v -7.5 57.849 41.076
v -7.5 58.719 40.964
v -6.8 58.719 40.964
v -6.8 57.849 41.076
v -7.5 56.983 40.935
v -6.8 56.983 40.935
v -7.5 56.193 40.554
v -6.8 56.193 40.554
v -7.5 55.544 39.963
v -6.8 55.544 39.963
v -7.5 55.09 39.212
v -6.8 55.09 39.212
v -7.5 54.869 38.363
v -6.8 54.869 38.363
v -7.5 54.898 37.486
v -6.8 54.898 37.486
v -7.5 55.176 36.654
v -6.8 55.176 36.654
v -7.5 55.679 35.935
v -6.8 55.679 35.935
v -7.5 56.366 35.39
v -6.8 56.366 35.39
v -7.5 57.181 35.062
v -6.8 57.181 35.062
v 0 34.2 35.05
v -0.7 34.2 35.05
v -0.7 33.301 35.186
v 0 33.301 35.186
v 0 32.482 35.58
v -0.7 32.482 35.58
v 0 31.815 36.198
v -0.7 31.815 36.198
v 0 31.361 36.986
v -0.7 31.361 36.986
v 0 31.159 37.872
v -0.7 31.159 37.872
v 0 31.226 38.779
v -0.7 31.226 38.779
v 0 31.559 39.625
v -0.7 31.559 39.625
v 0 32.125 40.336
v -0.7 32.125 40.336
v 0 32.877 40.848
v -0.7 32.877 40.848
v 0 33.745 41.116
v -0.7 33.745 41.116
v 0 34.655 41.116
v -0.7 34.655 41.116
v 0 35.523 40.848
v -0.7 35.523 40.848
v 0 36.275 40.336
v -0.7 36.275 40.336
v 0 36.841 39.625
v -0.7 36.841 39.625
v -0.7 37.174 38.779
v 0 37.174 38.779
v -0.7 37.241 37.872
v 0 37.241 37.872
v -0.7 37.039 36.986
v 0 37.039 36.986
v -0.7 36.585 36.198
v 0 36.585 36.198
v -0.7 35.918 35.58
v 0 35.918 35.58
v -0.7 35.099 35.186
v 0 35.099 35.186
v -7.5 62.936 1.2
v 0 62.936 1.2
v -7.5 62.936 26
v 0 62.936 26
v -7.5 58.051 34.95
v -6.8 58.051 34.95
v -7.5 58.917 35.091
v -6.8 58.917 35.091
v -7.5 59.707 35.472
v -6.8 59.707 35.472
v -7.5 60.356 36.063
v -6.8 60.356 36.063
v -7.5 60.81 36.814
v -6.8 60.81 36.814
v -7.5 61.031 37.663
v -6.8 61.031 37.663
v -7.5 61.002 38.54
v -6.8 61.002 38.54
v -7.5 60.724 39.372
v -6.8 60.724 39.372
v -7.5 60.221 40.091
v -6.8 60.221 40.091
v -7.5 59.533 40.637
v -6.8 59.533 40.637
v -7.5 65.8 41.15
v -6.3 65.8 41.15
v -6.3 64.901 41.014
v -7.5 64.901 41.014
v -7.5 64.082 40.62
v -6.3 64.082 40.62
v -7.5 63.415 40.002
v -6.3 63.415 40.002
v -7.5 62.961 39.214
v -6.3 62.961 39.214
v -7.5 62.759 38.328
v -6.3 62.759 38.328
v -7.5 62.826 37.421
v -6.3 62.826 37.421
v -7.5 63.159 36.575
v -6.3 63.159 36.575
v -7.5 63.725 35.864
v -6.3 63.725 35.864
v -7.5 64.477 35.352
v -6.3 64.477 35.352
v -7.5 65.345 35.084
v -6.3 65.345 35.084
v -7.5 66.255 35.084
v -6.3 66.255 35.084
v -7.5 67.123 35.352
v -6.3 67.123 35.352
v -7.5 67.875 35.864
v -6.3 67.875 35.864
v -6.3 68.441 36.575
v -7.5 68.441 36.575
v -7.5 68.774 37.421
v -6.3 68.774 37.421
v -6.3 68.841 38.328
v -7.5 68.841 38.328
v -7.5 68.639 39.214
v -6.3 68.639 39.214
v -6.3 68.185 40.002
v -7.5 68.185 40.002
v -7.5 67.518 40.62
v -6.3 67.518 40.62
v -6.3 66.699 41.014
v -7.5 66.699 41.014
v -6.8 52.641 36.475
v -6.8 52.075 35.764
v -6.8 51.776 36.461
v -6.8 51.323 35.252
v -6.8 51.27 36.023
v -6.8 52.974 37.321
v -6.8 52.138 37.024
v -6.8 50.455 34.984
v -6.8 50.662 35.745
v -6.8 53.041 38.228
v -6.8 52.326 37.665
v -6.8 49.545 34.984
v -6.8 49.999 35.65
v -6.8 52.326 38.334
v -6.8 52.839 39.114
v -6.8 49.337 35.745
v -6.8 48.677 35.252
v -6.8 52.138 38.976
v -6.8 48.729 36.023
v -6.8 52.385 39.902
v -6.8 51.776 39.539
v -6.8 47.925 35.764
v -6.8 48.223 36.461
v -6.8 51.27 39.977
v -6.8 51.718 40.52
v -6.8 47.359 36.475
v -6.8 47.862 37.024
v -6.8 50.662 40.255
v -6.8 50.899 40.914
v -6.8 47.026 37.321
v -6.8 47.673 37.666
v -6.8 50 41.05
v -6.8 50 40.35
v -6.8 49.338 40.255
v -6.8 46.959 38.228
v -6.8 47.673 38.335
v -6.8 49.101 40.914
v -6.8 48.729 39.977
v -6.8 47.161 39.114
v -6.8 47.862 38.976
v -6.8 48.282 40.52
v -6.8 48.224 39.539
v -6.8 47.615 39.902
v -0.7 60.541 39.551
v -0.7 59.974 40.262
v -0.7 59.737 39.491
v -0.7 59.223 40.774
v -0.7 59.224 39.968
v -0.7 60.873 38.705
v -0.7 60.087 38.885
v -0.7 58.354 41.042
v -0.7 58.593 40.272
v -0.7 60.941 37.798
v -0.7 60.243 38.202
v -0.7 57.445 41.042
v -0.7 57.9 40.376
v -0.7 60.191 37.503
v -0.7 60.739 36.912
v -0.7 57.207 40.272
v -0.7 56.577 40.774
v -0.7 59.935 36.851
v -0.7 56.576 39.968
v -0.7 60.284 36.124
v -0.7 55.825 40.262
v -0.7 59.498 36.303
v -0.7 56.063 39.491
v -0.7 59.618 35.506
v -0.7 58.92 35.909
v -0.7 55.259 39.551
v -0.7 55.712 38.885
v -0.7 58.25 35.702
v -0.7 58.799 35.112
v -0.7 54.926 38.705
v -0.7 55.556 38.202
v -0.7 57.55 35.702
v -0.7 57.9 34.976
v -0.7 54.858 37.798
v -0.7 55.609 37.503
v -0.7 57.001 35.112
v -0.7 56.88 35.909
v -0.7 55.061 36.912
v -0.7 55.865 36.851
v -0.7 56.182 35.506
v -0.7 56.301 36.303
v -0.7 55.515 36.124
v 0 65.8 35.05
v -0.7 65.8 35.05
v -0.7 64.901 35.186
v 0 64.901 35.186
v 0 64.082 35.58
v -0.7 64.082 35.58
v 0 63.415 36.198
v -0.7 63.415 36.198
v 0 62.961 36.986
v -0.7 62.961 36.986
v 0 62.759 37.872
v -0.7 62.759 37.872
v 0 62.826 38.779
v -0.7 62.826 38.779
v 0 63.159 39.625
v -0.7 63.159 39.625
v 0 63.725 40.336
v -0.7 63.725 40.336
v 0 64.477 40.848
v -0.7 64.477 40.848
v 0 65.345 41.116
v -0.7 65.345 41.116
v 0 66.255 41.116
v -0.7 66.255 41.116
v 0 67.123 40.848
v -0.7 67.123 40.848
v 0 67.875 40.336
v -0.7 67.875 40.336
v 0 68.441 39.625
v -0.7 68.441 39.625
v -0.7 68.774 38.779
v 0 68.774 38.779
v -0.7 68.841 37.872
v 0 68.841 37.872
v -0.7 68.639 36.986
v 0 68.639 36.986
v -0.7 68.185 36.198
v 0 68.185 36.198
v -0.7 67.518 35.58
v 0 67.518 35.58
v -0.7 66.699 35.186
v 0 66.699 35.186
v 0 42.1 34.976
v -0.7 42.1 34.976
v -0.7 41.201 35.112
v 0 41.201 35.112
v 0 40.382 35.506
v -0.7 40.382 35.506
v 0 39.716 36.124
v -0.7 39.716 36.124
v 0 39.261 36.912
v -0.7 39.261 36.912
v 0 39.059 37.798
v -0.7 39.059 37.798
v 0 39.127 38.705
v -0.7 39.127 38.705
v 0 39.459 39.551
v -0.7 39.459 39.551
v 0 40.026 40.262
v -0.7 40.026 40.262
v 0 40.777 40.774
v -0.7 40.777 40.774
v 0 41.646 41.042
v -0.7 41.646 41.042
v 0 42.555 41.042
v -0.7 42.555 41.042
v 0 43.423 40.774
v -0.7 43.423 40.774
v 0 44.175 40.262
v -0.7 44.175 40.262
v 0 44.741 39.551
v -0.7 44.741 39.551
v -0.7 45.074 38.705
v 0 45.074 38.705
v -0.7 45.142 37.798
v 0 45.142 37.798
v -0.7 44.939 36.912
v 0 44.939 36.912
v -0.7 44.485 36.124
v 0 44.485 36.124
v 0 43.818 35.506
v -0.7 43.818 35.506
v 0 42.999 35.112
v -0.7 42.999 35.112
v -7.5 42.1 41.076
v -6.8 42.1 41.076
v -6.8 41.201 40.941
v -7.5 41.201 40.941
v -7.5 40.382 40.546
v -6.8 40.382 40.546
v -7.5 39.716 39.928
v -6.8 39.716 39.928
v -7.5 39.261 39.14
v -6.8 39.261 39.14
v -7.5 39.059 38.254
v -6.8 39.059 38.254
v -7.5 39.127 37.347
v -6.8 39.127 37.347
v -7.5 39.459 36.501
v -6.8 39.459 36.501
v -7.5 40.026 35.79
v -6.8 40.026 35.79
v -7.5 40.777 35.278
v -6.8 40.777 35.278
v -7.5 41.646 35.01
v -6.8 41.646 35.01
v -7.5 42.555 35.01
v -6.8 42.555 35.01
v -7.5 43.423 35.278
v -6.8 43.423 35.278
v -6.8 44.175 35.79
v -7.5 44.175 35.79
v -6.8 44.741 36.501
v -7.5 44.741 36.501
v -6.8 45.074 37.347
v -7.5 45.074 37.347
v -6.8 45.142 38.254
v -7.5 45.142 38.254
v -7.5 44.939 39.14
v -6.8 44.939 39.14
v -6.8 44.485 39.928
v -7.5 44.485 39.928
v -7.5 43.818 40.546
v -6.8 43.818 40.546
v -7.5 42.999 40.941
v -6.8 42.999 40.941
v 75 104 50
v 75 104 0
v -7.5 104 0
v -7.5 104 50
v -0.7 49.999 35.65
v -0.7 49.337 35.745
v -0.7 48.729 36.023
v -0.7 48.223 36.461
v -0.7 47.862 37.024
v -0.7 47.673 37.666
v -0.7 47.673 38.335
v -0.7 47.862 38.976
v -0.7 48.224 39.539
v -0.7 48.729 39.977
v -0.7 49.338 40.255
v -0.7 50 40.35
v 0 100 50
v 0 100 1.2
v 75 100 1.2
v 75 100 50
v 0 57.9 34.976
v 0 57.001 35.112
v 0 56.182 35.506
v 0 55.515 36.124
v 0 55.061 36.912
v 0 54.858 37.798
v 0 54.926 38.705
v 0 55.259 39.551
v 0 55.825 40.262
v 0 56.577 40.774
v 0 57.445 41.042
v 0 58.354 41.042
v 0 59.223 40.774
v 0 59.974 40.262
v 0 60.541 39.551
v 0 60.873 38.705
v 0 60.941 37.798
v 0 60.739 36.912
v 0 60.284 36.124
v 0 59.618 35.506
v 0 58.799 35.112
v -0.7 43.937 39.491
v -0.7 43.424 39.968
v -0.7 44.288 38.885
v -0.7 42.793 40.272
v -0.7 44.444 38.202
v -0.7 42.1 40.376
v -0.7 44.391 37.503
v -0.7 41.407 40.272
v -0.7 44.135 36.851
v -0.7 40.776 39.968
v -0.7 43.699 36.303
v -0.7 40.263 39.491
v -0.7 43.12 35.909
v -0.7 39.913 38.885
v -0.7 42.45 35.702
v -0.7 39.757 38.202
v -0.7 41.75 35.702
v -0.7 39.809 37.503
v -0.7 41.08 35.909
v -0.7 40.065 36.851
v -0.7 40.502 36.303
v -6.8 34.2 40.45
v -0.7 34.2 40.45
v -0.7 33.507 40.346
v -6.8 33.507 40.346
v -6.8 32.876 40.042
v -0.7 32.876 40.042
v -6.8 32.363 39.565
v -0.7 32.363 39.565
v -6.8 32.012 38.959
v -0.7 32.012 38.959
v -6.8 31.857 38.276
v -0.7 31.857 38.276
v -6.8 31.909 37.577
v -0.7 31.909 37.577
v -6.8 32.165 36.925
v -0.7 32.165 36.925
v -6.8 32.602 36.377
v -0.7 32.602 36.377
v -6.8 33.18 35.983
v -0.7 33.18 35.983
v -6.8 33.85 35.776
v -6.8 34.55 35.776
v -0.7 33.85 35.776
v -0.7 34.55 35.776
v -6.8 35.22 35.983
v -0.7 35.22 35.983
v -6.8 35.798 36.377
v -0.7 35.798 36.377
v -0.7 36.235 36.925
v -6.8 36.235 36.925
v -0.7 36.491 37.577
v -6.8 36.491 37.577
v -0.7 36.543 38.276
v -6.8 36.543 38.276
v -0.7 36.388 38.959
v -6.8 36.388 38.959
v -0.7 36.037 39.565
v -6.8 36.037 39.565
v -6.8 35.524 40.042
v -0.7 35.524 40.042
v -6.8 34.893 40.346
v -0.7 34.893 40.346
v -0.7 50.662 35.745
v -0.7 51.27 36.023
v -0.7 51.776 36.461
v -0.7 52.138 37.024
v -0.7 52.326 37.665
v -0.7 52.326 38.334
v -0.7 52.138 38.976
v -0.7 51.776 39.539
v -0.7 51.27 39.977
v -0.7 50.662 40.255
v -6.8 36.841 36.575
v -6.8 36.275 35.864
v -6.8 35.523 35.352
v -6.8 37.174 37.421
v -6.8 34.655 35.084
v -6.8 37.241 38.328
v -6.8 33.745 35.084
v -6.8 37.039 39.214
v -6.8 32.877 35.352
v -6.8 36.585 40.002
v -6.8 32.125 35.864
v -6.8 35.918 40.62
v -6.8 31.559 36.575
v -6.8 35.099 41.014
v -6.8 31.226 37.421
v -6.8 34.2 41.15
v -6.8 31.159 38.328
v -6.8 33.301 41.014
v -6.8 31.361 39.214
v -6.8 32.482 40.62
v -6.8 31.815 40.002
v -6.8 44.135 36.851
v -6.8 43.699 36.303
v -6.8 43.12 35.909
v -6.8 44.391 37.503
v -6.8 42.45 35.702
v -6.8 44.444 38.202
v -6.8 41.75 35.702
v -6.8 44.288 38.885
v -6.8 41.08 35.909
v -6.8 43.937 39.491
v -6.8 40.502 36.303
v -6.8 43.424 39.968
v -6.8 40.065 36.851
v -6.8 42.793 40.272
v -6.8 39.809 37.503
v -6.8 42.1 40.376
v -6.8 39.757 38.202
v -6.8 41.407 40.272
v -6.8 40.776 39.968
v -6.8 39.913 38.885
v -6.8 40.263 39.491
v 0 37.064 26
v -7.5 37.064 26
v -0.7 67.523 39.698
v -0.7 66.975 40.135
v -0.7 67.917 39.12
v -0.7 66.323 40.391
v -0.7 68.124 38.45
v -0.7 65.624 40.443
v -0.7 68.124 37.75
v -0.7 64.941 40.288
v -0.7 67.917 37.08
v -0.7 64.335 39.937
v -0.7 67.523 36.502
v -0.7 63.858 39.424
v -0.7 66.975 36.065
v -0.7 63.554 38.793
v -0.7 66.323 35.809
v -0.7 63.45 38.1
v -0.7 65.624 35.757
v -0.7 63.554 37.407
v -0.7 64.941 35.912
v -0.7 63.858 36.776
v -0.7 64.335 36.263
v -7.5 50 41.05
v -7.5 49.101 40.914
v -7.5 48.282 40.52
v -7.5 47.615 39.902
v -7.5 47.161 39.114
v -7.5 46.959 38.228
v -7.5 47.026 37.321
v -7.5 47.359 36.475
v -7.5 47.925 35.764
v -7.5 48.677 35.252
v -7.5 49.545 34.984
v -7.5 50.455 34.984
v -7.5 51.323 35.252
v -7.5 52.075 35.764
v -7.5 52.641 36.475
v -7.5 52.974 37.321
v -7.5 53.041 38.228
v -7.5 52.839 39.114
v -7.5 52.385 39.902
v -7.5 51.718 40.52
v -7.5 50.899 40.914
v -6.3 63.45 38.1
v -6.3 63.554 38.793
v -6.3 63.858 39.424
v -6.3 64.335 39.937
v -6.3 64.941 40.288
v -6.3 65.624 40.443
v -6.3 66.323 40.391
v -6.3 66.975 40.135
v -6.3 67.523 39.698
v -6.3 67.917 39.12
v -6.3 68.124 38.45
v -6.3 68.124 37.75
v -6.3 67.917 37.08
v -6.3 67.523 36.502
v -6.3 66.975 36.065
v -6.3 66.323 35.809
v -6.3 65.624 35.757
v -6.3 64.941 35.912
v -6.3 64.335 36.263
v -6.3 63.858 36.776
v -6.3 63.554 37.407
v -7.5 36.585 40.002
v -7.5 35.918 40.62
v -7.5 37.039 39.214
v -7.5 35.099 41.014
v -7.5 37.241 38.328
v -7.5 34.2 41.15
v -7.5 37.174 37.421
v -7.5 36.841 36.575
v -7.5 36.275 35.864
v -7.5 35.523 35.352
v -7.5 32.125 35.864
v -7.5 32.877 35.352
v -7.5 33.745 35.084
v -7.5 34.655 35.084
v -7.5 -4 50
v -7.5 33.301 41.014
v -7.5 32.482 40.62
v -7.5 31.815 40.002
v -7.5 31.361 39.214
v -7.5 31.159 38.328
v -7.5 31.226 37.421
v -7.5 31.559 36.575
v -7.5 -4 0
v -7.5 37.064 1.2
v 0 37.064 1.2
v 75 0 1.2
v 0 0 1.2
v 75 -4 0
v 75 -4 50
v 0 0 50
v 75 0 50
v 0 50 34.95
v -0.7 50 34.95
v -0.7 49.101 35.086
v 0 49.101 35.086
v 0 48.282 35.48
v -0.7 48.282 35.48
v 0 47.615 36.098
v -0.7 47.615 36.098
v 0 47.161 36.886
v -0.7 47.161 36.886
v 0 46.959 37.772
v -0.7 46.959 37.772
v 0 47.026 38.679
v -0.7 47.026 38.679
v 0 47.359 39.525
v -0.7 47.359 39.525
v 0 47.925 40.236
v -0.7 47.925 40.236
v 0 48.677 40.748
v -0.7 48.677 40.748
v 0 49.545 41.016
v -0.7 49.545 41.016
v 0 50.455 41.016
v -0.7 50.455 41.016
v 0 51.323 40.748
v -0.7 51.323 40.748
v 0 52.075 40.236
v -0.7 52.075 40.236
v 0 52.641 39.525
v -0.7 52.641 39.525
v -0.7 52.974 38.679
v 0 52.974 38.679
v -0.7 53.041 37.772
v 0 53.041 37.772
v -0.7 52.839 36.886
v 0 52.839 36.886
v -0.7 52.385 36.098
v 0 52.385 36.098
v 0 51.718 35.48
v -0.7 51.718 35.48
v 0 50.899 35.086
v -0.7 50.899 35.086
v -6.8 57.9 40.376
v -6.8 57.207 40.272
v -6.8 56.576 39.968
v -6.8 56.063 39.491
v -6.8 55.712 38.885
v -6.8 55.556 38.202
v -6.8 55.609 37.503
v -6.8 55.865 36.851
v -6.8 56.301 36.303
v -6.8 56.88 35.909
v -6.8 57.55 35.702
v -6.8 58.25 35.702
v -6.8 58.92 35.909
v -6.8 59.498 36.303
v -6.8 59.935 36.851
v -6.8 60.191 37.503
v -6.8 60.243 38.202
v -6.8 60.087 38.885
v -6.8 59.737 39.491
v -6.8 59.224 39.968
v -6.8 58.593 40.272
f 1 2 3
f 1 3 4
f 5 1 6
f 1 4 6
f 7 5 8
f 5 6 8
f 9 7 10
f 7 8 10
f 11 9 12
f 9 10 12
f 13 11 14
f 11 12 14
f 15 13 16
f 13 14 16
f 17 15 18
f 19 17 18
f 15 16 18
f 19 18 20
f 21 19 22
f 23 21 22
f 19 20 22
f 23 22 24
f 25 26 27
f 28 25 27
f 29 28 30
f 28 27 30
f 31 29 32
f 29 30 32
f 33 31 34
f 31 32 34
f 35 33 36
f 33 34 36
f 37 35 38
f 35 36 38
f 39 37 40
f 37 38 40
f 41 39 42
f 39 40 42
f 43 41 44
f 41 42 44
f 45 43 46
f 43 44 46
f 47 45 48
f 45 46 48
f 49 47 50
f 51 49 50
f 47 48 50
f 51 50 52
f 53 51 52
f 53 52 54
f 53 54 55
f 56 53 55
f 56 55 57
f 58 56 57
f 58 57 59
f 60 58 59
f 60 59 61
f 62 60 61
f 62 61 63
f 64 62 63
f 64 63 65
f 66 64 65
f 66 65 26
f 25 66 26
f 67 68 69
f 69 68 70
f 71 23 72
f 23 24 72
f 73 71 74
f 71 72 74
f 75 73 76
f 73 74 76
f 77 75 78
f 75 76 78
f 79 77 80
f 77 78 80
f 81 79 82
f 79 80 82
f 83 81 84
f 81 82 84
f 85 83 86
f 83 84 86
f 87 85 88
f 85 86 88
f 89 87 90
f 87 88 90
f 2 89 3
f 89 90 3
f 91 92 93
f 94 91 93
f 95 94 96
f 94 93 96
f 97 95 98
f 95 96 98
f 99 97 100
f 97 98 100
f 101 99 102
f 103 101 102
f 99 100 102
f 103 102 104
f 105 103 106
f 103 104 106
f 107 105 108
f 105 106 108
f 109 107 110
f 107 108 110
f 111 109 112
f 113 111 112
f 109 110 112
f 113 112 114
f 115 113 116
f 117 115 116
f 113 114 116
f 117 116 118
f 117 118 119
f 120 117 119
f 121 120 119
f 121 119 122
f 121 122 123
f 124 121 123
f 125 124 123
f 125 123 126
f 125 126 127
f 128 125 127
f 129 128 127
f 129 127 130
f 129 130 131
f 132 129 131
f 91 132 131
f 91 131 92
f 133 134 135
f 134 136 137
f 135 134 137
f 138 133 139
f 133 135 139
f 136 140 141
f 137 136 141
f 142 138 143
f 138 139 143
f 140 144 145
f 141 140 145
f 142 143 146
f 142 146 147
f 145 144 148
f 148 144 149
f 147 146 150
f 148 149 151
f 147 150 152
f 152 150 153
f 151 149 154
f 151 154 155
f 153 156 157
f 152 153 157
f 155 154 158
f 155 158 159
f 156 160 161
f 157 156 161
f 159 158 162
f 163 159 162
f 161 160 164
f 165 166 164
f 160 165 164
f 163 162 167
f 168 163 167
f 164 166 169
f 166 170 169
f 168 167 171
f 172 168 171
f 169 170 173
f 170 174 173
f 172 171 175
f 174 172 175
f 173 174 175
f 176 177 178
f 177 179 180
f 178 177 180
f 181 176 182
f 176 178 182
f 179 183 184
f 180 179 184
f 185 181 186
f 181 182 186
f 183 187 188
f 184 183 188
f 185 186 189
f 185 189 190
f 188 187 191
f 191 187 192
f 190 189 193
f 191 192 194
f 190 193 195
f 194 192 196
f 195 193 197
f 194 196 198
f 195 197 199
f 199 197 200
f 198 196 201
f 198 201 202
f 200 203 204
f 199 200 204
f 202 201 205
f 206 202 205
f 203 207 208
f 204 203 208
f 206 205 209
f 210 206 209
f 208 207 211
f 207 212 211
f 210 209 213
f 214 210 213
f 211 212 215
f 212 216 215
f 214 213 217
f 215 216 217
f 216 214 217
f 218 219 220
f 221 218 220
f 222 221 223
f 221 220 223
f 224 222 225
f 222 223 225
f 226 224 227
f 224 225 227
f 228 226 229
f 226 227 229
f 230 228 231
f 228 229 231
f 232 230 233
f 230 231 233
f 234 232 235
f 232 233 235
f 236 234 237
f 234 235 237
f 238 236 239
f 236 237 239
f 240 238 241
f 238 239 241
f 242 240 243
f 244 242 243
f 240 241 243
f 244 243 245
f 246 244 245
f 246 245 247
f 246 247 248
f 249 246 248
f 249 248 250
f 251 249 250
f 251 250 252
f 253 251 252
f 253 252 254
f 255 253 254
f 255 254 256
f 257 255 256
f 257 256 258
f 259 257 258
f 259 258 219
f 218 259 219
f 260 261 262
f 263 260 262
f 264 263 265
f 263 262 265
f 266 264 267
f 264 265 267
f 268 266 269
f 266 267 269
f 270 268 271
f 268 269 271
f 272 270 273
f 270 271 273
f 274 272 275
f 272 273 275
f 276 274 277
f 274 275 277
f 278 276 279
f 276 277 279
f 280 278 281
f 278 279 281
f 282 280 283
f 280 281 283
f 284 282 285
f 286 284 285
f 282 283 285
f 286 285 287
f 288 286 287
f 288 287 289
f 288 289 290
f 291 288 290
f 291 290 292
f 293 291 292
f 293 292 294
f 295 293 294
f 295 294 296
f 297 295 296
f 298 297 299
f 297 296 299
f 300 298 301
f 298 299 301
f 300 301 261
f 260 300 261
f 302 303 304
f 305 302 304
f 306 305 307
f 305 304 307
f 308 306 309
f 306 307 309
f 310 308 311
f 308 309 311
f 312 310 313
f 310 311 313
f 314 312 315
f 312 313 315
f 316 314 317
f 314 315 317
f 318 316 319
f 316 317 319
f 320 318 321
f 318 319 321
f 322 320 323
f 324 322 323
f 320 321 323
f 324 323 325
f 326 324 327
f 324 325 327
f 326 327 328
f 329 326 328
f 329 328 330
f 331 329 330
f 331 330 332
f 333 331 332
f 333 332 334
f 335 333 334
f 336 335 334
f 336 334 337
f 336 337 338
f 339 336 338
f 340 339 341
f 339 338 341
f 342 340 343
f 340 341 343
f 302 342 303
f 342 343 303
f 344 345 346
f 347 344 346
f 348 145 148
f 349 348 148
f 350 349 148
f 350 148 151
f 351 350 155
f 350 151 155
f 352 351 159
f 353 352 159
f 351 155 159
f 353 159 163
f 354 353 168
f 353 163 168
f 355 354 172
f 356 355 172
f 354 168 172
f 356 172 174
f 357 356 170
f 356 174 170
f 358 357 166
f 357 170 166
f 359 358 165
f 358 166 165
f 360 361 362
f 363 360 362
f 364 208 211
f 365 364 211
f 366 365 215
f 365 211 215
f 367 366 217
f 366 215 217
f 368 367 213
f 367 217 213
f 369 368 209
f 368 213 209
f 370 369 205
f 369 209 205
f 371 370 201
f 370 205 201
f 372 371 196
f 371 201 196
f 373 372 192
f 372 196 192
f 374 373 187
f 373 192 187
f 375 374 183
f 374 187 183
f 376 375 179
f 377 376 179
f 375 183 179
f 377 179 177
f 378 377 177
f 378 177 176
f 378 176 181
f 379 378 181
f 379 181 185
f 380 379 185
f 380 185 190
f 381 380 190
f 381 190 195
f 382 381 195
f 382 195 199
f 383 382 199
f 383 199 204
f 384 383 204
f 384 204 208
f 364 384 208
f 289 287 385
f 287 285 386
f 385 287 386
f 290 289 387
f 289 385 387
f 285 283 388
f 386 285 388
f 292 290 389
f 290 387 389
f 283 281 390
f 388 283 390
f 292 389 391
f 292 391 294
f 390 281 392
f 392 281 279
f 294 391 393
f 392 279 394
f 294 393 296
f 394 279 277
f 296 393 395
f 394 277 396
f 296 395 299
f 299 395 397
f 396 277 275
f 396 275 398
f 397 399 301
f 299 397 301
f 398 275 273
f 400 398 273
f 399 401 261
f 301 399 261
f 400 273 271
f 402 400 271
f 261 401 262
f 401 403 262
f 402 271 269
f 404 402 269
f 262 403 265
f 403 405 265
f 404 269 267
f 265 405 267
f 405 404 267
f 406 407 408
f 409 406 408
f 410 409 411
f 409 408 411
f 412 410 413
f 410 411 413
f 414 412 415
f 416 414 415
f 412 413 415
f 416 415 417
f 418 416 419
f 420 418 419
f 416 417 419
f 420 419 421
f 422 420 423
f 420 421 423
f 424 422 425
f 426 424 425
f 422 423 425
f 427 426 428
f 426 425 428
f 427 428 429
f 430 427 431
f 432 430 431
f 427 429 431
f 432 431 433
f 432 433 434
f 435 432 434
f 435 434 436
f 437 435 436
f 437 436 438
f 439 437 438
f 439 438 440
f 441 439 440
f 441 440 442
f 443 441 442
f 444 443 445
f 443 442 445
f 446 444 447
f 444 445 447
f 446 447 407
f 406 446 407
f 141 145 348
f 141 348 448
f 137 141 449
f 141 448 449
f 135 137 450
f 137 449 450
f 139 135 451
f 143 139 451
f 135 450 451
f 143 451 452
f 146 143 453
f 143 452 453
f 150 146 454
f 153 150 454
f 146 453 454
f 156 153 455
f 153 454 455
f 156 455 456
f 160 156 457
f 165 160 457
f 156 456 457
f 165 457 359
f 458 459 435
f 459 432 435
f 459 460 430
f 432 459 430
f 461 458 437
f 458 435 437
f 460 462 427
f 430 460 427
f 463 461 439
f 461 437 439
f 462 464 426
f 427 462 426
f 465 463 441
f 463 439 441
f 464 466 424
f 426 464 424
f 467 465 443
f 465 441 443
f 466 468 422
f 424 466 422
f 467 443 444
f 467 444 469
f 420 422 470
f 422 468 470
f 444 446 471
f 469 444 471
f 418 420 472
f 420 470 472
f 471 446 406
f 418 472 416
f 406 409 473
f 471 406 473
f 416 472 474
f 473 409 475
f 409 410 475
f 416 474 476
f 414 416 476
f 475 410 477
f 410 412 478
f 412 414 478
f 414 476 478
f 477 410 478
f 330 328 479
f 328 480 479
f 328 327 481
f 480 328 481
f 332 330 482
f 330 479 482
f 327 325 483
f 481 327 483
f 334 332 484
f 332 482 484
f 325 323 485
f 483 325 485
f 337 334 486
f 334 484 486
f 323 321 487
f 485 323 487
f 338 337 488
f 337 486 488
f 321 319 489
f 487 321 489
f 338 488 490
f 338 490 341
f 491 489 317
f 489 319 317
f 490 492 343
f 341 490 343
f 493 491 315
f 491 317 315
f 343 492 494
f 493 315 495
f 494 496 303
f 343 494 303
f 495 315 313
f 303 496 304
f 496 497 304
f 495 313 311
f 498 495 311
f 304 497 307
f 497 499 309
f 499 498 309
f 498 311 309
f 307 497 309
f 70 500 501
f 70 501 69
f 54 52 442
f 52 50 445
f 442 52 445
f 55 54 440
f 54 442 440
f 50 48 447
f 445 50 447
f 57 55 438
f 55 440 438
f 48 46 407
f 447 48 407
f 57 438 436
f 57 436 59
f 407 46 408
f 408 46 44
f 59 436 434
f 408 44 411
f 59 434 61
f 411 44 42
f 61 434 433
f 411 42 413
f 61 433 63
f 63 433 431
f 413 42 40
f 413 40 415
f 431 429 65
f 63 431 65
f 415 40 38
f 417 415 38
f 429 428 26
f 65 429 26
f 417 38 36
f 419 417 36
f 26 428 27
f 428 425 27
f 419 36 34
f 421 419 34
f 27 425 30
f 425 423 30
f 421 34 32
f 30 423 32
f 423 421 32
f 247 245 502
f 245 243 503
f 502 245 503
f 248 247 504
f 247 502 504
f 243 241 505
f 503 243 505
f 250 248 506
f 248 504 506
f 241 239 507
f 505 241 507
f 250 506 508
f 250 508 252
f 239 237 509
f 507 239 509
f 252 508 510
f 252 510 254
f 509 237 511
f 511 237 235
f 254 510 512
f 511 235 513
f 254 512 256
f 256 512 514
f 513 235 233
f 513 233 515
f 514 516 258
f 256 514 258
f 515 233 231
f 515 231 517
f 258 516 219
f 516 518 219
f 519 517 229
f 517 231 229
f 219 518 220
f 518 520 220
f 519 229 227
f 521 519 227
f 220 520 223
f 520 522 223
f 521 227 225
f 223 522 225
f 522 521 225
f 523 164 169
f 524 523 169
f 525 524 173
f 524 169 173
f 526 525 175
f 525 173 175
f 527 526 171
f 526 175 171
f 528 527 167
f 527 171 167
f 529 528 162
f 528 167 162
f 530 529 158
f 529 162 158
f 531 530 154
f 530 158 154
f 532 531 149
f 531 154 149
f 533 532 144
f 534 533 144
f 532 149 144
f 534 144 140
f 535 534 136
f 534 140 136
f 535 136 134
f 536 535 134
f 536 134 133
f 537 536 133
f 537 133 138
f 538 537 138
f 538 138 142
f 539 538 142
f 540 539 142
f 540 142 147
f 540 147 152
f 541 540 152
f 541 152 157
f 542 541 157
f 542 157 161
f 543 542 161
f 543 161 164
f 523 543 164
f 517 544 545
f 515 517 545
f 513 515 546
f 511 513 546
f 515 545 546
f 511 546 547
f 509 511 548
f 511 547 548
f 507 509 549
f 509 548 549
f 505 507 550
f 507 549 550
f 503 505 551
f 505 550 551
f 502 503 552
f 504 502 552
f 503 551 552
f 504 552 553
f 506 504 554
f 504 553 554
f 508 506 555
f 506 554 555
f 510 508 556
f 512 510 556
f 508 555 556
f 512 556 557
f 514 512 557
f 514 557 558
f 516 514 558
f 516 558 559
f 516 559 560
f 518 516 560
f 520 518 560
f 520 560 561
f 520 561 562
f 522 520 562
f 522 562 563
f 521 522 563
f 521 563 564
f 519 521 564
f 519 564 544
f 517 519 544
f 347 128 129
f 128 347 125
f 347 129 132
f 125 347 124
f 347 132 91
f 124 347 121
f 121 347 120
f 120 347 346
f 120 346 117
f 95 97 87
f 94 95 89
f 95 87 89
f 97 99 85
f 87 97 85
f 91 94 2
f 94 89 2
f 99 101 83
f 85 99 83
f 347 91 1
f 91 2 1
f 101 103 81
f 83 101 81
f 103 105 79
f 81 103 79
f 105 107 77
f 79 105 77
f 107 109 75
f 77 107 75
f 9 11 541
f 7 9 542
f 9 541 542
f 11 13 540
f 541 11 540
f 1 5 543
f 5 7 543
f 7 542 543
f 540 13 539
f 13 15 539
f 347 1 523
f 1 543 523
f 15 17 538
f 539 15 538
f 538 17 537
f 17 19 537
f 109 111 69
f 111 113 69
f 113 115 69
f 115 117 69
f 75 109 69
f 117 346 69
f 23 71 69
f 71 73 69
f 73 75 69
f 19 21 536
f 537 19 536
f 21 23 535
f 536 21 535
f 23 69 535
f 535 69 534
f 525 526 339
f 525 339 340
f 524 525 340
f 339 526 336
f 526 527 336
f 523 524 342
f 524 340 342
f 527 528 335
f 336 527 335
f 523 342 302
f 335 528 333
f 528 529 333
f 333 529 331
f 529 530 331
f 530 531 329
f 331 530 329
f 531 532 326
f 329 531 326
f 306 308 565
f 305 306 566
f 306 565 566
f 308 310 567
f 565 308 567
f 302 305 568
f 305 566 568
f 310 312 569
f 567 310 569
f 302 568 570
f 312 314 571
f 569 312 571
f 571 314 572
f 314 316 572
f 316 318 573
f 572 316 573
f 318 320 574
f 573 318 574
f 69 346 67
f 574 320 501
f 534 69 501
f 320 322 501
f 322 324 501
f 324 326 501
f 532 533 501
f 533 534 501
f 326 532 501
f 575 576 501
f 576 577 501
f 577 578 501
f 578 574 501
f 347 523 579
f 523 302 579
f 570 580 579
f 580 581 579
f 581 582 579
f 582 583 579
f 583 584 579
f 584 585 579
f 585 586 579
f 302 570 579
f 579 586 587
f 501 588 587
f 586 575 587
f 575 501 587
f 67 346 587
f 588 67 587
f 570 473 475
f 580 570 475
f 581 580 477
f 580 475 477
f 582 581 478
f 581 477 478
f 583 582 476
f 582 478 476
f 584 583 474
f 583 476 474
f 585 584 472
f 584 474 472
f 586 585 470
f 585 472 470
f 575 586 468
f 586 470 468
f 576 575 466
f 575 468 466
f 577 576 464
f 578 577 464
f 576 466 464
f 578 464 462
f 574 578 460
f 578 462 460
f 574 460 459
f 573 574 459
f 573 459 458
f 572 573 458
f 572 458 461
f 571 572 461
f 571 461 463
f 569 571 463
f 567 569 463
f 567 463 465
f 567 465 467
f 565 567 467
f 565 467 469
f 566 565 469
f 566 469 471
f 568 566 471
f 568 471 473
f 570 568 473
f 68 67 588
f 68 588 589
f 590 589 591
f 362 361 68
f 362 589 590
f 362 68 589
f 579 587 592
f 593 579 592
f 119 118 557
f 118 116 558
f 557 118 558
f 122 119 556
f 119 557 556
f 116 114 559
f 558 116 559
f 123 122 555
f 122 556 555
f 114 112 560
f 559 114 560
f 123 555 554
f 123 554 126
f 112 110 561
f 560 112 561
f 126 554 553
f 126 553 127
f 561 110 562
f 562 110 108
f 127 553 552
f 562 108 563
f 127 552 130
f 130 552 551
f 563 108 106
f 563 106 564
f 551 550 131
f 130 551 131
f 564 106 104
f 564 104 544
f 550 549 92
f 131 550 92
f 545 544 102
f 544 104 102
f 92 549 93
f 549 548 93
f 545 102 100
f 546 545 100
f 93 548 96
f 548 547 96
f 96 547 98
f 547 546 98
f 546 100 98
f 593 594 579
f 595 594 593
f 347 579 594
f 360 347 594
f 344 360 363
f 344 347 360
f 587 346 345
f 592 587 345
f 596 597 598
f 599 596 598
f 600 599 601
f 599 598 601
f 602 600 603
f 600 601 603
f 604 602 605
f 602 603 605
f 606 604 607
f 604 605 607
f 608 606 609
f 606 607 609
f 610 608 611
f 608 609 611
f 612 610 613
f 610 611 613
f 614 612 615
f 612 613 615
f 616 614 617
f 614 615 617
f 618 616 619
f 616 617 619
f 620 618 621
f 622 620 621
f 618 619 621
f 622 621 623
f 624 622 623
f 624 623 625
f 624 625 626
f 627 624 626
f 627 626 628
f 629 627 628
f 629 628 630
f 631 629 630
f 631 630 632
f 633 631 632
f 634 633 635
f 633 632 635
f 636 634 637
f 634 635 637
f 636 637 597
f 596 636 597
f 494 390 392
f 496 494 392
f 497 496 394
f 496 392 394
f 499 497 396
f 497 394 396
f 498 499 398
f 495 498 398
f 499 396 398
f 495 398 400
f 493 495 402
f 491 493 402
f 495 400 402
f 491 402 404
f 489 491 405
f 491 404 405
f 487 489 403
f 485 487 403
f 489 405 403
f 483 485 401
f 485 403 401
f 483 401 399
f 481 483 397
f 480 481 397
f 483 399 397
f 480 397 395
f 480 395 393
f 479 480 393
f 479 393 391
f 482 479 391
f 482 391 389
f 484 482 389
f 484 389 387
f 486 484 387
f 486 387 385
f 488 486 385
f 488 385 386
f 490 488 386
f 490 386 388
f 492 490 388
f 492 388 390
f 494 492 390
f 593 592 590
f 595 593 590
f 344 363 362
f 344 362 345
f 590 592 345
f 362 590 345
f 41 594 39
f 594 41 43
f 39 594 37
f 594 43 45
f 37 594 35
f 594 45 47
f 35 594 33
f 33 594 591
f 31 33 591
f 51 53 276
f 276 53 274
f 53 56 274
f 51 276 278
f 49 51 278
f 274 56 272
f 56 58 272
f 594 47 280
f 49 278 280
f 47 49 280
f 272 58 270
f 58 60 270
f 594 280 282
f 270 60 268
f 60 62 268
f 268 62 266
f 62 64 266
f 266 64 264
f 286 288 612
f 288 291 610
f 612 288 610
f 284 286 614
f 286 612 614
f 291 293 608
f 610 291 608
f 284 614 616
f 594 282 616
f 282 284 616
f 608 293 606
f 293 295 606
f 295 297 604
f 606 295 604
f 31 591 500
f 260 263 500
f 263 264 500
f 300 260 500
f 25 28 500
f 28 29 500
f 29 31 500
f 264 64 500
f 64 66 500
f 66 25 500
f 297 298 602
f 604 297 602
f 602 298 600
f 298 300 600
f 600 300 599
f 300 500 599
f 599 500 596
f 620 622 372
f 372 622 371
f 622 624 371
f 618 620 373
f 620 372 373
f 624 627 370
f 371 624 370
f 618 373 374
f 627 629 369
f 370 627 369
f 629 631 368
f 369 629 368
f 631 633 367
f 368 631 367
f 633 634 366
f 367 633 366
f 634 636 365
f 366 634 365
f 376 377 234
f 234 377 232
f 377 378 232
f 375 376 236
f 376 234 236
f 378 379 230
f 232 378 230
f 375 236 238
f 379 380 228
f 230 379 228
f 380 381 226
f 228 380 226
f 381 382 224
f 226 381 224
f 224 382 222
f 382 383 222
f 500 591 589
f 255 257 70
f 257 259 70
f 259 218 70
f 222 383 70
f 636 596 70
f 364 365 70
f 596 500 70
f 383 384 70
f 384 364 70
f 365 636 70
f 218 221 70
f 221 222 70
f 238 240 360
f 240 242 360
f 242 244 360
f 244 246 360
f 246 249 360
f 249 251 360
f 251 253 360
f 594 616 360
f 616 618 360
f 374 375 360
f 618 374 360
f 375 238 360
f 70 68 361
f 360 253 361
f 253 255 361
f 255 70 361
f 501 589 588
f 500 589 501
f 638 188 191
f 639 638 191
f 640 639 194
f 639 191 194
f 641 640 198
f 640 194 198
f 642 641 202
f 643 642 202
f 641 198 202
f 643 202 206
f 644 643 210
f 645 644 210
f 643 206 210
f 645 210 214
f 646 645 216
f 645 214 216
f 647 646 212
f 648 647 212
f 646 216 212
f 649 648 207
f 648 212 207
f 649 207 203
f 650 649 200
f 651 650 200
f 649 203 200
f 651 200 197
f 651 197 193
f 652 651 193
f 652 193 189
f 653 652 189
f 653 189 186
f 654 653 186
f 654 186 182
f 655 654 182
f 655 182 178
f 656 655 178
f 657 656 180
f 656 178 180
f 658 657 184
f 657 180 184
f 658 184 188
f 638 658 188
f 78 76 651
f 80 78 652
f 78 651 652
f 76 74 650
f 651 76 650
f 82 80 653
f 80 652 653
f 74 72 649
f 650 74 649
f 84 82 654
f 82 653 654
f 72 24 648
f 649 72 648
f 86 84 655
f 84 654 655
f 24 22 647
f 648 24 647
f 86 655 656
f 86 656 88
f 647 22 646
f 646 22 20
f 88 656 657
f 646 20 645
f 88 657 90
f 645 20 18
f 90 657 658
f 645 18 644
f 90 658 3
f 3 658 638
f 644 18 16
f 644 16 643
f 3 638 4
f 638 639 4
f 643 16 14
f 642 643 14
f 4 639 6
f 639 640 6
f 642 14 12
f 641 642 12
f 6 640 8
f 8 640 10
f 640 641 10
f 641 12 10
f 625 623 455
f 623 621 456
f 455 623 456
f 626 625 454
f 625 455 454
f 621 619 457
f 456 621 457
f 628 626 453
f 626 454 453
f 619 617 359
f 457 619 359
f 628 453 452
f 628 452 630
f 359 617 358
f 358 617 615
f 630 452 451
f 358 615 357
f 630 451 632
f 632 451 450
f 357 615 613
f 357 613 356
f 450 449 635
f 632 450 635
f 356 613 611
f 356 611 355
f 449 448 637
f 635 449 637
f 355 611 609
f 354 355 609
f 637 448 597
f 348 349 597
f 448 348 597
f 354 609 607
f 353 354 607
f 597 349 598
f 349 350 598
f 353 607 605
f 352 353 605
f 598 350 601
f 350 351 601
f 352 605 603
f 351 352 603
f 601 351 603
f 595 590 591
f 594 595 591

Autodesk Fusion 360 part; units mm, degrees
sketch "Sketch1" plane through (0, 0, 0) normal (0, 0, 1) x (1, 0, 0)
  line L0 (0, 0) -> (140, 0)
  line L1 (140, 0) -> (140, 150)
  line L2 (140, 150) -> (0, 150)
  line L3 (0, 150) -> (0, 0)
sketch "Sketch2" plane through (0, 0, 0) normal (0, 0, 1) x (1, 0, 0)
sketch "Sketch3" plane through (0, 0, 0) normal (0, 0, 1) x (1, 0, 0)
  line L0 (0, 0) -> (0, 100)
  line L1 (0, 100) -> (75, 100)
  line L2 (75, 100) -> (75, 0)
  line L3 (75, 0) -> (0, 0)
  line L4 (75, 100) -> (75, 104)
  line L5 (75, 104) -> (-7.5, 104)
  line L6 (-7.5, 104) -> (-7.5, -4)
  line L7 (-7.5, -4) -> (75, -4)
  line L8 (75, -4) -> (75, 0)
  dimension "d4" = 75
  dimension "d5" = 4
  dimension "d6" = 82.5
  dimension "d7" = 108
  dimension "d8" = 82.5
extrude "Extrude2" add sketch "Sketch3" along normal blind 50 contours L0 L1 L3 L4 L5 L6 L7 L8
sketch "Sketch4" plane through (0, 0, 0) normal (0, 0, 1) x (1, 0, 0)
sketch "Sketch5" plane through (0, 0, 0) normal (0, 0, 1) x (1, 0, 0)
  line L0 (75, 0) -> (75, 100)
  line L1 (75, 100) -> (0, 100)
  line L2 (0, 100) -> (0, 0)
  line L3 (0, 0) -> (75, 0)
extrude "Extrude3" add sketch "Sketch5" along normal blind 1.2
sketch "Sketch6" plane through (0, 0, 0) normal (1, 0, 0) x (0, 1, 0)
  line L0 (0, 1.2) -> (100, 1.2)
  line L1 (100, 1.2) -> (100, 50)
  line L2 (100, 50) -> (0, 50)
  line L3 (0, 50) -> (0, 1.2)
sketch "Sketch7" plane through (0, 0, 0) normal (1, 0, 0) x (0, 1, 0)
  line L0 (92, -12) -> (91.9892, -11.1216)
sketch "Sketch8" plane through (0, 0, 0) normal (1, 0, 0) x (0, 1, 0)
sketch "Sketch9" plane through (0, 0, 0) normal (1, 0, 0) x (0, 1, 0)
sketch "Sketch10" plane through (0, 0, 0) normal (1, 0, 0) x (0, 1, 0)
  line L0 (0, 1.2) -> (100, 1.2)
  line L1 (100, 1.2) -> (100, 50)
  line L2 (100, 50) -> (0, 50)
  line L3 (0, 50) -> (0, 1.2)
  line L4 (37.0644, 1.2) -> (37.0644, 26)
  line L5 (37.0644, 26) -> (50, 26)
  line L6 (7, 61) -> (6, 65)
  line L7 (62.9356, 26) -> (50, 26)
  line L8 (62.9356, 1.2) -> (62.9356, 26)
sketch "Sketch11" plane through (0, 0, 0) normal (1, 0, 0) x (0, 1, 0)
  line L0 (37, 1) -> (63, 1)
extrude "Extrude4" cut sketch "Sketch10" against normal blind 16 contours L0 L4 L5 L7 L8
sketch "Sketch12" plane through (0, 0, 0) normal (1, 0, 0) x (0, 1, 0)
sketch "Sketch19" plane through (-7.5, 0, 0) normal (-1, 0, 0) x (0, -1, 0)
  line L0 (-62.9356, 1.2) -> (-62.9356, 26)
  line L1 (-62.9356, 26) -> (-37.0644, 26)
  line L2 (-37.0644, 26) -> (-37.0644, 1.2)
  line L3 (-37.0644, 1.2) -> (-62.9356, 1.2)
  line L4 (-104, 0) -> (4, 0)
  line L5 (4, 0) -> (4, 50)
  line L6 (4, 50) -> (-104, 50)
  line L7 (-104, 50) -> (-104, 0)
  line L8 (-50, 26) -> (-50, 50)
  circle A0 centre (-50, 38) radius 3.05
  line L9 (-53.0499, 38.0261) -> (-54.8499, 38.0261)
  circle A1 centre (-57.8999, 38.0261) radius 3.05
  line L10 (-60.9495, 37.9796) -> (-62.7495, 37.9796)
  circle A2 centre (-65.7995, 37.9942) radius 3.05
  circle A3 centre (-34.2005, 37.9942) radius 3.05
  circle A4 centre (-42.1001, 38.0261) radius 3.05
  line L11 (-46.9501, 38.0261) -> (-45.1501, 38.0261)
  line L12 (-39.0505, 37.9796) -> (-37.2505, 37.9796)
  circle A5 centre (-50, 38) radius 2.35
  circle A6 centre (-65.7995, 37.9942) radius 2.35
  circle A7 centre (-57.8999, 38.0261) radius 2.35
  circle A8 centre (-42.1001, 38.0261) radius 2.35
  circle A9 centre (-34.2005, 37.9942) radius 2.35
  dimension "d35" = 6.1
  dimension "d36" = 1.8
  dimension "d37" = 6.1
  dimension "d38" = 1.8
  dimension "d39" = 6.1
  dimension "d40" = 4.7
  dimension "d41" = 4.7
  dimension "d42" = 4.7
  dimension "d43" = 4.7
  dimension "d44" = 4.7
sketch "Sketch13" plane through (-7.5, 0, 0) normal (-1, 0, 0) x (0, -1, 0)
  line L0 (-62.9356, 1.2) -> (-62.9356, 26)
  line L1 (-62.9356, 26) -> (-37.0644, 26)
  line L2 (-37.0644, 26) -> (-37.0644, 1.2)
  line L3 (-37.0644, 1.2) -> (-62.9356, 1.2)
  line L4 (-104, 0) -> (4, 0)
  line L5 (4, 0) -> (4, 50)
  line L6 (4, 50) -> (-104, 50)
  line L7 (-104, 50) -> (-104, 0)
sketch "Sketch14" plane through (-7.5, 50, 25) normal (-1, 0, 0) x (0, -1, 0)
  line L0 (0.0006, 25) -> (0.0006, 1)
  line L1 (-12.9356, 1) -> (12.9356, 1)
  line L2 (54, 25) -> (-54, 25)
  circle A0 centre (0.0006, 13) radius 3.05
  circle A1 centre (0.0006, 13) radius 2.35
  dimension "d18" = 6.1
  dimension "d19" = 4.7
sketch "Sketch15" plane through (-7.5, 50, 25) normal (-1, 0, 0) x (0, -1, 0)
sketch "Sketch16" plane through (-7.5, 0, 0) normal (-1, 0, 0) x (0, -1, 0)
  line L0 (-53.0494, 38) -> (-54.8494, 38)
  circle A0 centre (-57.8994, 38) radius 3.05
  circle A1 centre (-57.8994, 38) radius 2.35
  circle A2 centre (-49.9994, 38) radius 3.05
  line L1 (-60.9494, 38) -> (-62.7494, 38)
  circle A3 centre (-65.8, 38.1) radius 3.05
  circle A4 centre (-65.8, 38.1) radius 2.35
  line L2 (-49.9994, 50) -> (-49.9994, 26)
  circle A5 centre (-42.0994, 38) radius 2.35
  circle A6 centre (-42.0994, 38) radius 3.05
  circle A7 centre (-34.1988, 38.1) radius 2.35
  circle A8 centre (-34.1988, 38.1) radius 3.05
  line L3 (-39.0494, 38) -> (-37.2494, 38)
  line L4 (-46.9494, 38) -> (-45.1494, 38)
  dimension "d24" = 1.8
  dimension "d25" = 6.1
  dimension "d26" = 4.7
  dimension "d27" = 1.8
  dimension "d28" = 6.1
  dimension "d29" = 4.7
extrude "Extrude5" cut sketch "Sketch16" against normal blind 19 contours A4
sketch "Sketch18" plane through (-7.5, 50, 25) normal (-1, 0, 0) x (0, -1, 0)
sketch "Sketch17" plane through (-7.5, 0, 0) normal (-1, 0, 0) x (0, -1, 0)
extrude "Extrude6" cut sketch "Sketch14" against normal blind 7 contours L0 A1 picked at (0.839, 13.6628)
hole "Hole1" at (-7.5, 57.8999, 38.0261) direction (1, 0, 0) diameter 4.7 depth 8 tip angle 180
sketch "Sketch20" plane through (-7.5, 0, 0) normal (-1, 0, 0) x (0, -1, 0)
sketch "Sketch21" plane through (-7.5, 0, 0) normal (-1, 0, 0) x (0, -1, 0)
  line L0 (-50, 50) -> (-50, 26)
  circle A0 centre (-50, 38) radius 3.05
  circle A1 centre (-57.8999, 38.0261) radius 3.05
  circle A2 centre (-57.8999, 38.0261) radius 2.35
  circle A3 centre (-65.8, 38.1) radius 2.9921
  circle A4 centre (-65.8, 38.1) radius 2.35
  circle A5 centre (-50, 38) radius 2.35
  dimension "d48" = 6.1
  dimension "d49" = 6.1
  dimension "d50" = 4.7
hole "Hole2" at (-7.5, 50, 38) direction (1, 0, 0) diameter 4.7 depth 8 tip angle 180
sketch "Sketch22" plane through (-7.5, 0, 0) normal (-1, 0, 0) x (0, -1, 0)
  line L0 (-50, 50) -> (-50, 26)
  circle A0 centre (-65.8, 38.1) radius 2.35
  circle A1 centre (-65.8, 38.1) radius 2.35
  circle A2 centre (-34.2, 38.1) radius 2.35
  dimension "d54" = 4.7
hole "Hole3" at (-7.5, 34.2, 38.1) direction (1, 0, 0) diameter 4.7 depth 8 tip angle 180
sketch "Sketch23" plane through (-7.5, 0, 0) normal (-1, 0, 0) x (0, -1, 0)
  circle A0 centre (-57.8999, 38.0261) radius 2.35
  circle A1 centre (-57.8999, 38.0261) radius 2.35
  line L0 (-50, 50) -> (-50, 26)
  circle A2 centre (-42.1001, 38.0261) radius 2.35
  dimension "d58" = 4.7
hole "Hole4" at (-7.5, 42.1001, 38.0261) direction (1, 0, 0) diameter 4.7 depth 8 tip angle 180
sketch "Sketch24" plane through (-7.5, 0, 0) normal (-1, 0, 0) x (0, -1, 0)
  circle A0 centre (-65.8, 38.1) radius 3.05
  circle A1 centre (-65.8, 38.1) radius 2.35
  dimension "d62" = 6.1
sketch "Sketch25" plane through (-7.5, 0, 0) normal (-1, 0, 0) x (0, -1, 0)
  circle A0 centre (-65.8, 38.1) radius 3.05
  circle A1 centre (-65.8, 38.1) radius 2.35
  dimension "d66" = 6.1
sketch "Sketch26" plane through (-7.5, 0, 0) normal (-1, 0, 0) x (0, -1, 0)
  circle A0 centre (-65.8, 38.1) radius 3.05
  circle A1 centre (-65.8, 38.1) radius 2.35
  dimension "d70" = 6.1
sketch "Sketch27" plane through (-7.5, 0, 0) normal (-1, 0, 0) x (0, -1, 0)
  circle A0 centre (-65.8, 38.1) radius 3.05
  circle A1 centre (-65.8, 38.1) radius 2.35
  dimension "d74" = 6.1
hole "Hole8" at (-7.5, 65.8, 38.1) direction (1, 0, 0) diameter 6.1 depth 0.7 tip angle 180
sketch "Sketch28" plane through (-7.5, 0, 0) normal (-1, 0, 0) x (0, -1, 0)
  circle A0 centre (-58, 38) radius 3.05
  dimension "d78" = 6.1
sketch "Sketch29" plane through (-7.5, 0, 0) normal (-1, 0, 0) x (0, -1, 0)
  circle A0 centre (-57.8999, 38.0261) radius 3.05
  circle A1 centre (-57.8999, 38.0261) radius 2.35
  dimension "d82" = 6.1
hole "Hole10" at (-7.5, 57.8999, 38.0261) direction (1, 0, 0) diameter 6.1 depth 0.7 tip angle 180
sketch "Sketch30" plane through (-7.5, 0, 0) normal (-1, 0, 0) x (0, -1, 0)
  circle A0 centre (-50, 38) radius 3.05
  dimension "d86" = 6.1
hole "Hole11" at (-7.5, 50, 38) direction (1, 0, 0) diameter 6.1 depth 0.7 tip angle 180
sketch "Sketch31" plane through (-7.5, 0, 0) normal (-1, 0, 0) x (0, -1, 0)
  circle A0 centre (-42.1001, 38.0261) radius 3.05
  circle A1 centre (-42.1001, 38.0261) radius 2.35
  dimension "d90" = 6.1
hole "Hole12" at (-7.5, 42.1001, 38.0261) direction (1, 0, 0) diameter 6.1 depth 0.7 tip angle 180
sketch "Sketch32" plane through (-7.5, 0, 0) normal (-1, 0, 0) x (0, -1, 0)
  circle A0 centre (-34.2, 38.1) radius 3.05
  circle A1 centre (-34.2, 38.1) radius 2.35
  dimension "d94" = 6.1
hole "Hole13" at (-7.5, 34.2, 38.1) direction (1, 0, 0) diameter 6.1 depth 0.7 tip angle 180
sketch "Sketch33" plane through (0, 0, 0) normal (1, 0, 0) x (0, 1, 0)
  circle A0 centre (34.2, 38.1) radius 3.05
  circle A1 centre (34.2, 38.1) radius 2.35
  dimension "d98" = 6.1
hole "Hole14" at (0, 34.2, 38.1) direction (-1, 0, 0) diameter 6.1 depth 0.7 tip angle 180
sketch "Sketch34" plane through (0, 0, 0) normal (1, 0, 0) x (0, 1, 0)
  circle A0 centre (42.1001, 38.0261) radius 3.05
  circle A1 centre (42.1001, 38.0261) radius 2.35
  dimension "d102" = 6.1
hole "Hole15" at (0, 42.1001, 38.0261) direction (-1, 0, 0) diameter 6.1 depth 0.7 tip angle 180
sketch "Sketch35" plane through (0, 0, 0) normal (1, 0, 0) x (0, 1, 0)
  circle A0 centre (50, 38) radius 3.05
  dimension "d107" = 6.1
hole "Hole16" at (0, 50, 38) direction (-1, 0, 0) diameter 6.1 depth 0.7 tip angle 180
sketch "Sketch36" plane through (0, 0, 0) normal (1, 0, 0) x (0, 1, 0)
  circle A0 centre (57.8999, 38.0261) radius 3.05
  circle A1 centre (57.8999, 38.0261) radius 2.35
  dimension "d111" = 6.1
hole "Hole17" at (0, 57.8999, 38.0261) direction (-1, 0, 0) diameter 6.1 depth 0.7 tip angle 180
sketch "Sketch37" plane through (0, 0, 0) normal (1, 0, 0) x (0, 1, 0)
  circle A0 centre (65.8, 38.1) radius 3.05
  circle A1 centre (65.8, 38.1) radius 2.35
  dimension "d115" = 6.1
hole "Hole18" at (0, 65.8, 38.1) direction (-1, 0, 0) diameter 6.1 depth 0.7 tip angle 180
hole "Hole9" at (-7.5, 58, 38) direction (1, 0, 0) diameter 6.1 depth 0.7 tip angle 180
hole "Hole7" at (-7.5, 65.8, 38.1) direction (1, 0, 0) diameter 6.1 depth 1 tip angle 180
hole "Hole6" at (-7.5, 65.8, 38.1) direction (1, 0, 0) diameter 6.1 depth 1.2 tip angle 180
hole "Hole5" at (-7.5, 65.8, 38.1) direction (1, 0, 0) diameter 6.1 depth 0.1 tip angle 180
